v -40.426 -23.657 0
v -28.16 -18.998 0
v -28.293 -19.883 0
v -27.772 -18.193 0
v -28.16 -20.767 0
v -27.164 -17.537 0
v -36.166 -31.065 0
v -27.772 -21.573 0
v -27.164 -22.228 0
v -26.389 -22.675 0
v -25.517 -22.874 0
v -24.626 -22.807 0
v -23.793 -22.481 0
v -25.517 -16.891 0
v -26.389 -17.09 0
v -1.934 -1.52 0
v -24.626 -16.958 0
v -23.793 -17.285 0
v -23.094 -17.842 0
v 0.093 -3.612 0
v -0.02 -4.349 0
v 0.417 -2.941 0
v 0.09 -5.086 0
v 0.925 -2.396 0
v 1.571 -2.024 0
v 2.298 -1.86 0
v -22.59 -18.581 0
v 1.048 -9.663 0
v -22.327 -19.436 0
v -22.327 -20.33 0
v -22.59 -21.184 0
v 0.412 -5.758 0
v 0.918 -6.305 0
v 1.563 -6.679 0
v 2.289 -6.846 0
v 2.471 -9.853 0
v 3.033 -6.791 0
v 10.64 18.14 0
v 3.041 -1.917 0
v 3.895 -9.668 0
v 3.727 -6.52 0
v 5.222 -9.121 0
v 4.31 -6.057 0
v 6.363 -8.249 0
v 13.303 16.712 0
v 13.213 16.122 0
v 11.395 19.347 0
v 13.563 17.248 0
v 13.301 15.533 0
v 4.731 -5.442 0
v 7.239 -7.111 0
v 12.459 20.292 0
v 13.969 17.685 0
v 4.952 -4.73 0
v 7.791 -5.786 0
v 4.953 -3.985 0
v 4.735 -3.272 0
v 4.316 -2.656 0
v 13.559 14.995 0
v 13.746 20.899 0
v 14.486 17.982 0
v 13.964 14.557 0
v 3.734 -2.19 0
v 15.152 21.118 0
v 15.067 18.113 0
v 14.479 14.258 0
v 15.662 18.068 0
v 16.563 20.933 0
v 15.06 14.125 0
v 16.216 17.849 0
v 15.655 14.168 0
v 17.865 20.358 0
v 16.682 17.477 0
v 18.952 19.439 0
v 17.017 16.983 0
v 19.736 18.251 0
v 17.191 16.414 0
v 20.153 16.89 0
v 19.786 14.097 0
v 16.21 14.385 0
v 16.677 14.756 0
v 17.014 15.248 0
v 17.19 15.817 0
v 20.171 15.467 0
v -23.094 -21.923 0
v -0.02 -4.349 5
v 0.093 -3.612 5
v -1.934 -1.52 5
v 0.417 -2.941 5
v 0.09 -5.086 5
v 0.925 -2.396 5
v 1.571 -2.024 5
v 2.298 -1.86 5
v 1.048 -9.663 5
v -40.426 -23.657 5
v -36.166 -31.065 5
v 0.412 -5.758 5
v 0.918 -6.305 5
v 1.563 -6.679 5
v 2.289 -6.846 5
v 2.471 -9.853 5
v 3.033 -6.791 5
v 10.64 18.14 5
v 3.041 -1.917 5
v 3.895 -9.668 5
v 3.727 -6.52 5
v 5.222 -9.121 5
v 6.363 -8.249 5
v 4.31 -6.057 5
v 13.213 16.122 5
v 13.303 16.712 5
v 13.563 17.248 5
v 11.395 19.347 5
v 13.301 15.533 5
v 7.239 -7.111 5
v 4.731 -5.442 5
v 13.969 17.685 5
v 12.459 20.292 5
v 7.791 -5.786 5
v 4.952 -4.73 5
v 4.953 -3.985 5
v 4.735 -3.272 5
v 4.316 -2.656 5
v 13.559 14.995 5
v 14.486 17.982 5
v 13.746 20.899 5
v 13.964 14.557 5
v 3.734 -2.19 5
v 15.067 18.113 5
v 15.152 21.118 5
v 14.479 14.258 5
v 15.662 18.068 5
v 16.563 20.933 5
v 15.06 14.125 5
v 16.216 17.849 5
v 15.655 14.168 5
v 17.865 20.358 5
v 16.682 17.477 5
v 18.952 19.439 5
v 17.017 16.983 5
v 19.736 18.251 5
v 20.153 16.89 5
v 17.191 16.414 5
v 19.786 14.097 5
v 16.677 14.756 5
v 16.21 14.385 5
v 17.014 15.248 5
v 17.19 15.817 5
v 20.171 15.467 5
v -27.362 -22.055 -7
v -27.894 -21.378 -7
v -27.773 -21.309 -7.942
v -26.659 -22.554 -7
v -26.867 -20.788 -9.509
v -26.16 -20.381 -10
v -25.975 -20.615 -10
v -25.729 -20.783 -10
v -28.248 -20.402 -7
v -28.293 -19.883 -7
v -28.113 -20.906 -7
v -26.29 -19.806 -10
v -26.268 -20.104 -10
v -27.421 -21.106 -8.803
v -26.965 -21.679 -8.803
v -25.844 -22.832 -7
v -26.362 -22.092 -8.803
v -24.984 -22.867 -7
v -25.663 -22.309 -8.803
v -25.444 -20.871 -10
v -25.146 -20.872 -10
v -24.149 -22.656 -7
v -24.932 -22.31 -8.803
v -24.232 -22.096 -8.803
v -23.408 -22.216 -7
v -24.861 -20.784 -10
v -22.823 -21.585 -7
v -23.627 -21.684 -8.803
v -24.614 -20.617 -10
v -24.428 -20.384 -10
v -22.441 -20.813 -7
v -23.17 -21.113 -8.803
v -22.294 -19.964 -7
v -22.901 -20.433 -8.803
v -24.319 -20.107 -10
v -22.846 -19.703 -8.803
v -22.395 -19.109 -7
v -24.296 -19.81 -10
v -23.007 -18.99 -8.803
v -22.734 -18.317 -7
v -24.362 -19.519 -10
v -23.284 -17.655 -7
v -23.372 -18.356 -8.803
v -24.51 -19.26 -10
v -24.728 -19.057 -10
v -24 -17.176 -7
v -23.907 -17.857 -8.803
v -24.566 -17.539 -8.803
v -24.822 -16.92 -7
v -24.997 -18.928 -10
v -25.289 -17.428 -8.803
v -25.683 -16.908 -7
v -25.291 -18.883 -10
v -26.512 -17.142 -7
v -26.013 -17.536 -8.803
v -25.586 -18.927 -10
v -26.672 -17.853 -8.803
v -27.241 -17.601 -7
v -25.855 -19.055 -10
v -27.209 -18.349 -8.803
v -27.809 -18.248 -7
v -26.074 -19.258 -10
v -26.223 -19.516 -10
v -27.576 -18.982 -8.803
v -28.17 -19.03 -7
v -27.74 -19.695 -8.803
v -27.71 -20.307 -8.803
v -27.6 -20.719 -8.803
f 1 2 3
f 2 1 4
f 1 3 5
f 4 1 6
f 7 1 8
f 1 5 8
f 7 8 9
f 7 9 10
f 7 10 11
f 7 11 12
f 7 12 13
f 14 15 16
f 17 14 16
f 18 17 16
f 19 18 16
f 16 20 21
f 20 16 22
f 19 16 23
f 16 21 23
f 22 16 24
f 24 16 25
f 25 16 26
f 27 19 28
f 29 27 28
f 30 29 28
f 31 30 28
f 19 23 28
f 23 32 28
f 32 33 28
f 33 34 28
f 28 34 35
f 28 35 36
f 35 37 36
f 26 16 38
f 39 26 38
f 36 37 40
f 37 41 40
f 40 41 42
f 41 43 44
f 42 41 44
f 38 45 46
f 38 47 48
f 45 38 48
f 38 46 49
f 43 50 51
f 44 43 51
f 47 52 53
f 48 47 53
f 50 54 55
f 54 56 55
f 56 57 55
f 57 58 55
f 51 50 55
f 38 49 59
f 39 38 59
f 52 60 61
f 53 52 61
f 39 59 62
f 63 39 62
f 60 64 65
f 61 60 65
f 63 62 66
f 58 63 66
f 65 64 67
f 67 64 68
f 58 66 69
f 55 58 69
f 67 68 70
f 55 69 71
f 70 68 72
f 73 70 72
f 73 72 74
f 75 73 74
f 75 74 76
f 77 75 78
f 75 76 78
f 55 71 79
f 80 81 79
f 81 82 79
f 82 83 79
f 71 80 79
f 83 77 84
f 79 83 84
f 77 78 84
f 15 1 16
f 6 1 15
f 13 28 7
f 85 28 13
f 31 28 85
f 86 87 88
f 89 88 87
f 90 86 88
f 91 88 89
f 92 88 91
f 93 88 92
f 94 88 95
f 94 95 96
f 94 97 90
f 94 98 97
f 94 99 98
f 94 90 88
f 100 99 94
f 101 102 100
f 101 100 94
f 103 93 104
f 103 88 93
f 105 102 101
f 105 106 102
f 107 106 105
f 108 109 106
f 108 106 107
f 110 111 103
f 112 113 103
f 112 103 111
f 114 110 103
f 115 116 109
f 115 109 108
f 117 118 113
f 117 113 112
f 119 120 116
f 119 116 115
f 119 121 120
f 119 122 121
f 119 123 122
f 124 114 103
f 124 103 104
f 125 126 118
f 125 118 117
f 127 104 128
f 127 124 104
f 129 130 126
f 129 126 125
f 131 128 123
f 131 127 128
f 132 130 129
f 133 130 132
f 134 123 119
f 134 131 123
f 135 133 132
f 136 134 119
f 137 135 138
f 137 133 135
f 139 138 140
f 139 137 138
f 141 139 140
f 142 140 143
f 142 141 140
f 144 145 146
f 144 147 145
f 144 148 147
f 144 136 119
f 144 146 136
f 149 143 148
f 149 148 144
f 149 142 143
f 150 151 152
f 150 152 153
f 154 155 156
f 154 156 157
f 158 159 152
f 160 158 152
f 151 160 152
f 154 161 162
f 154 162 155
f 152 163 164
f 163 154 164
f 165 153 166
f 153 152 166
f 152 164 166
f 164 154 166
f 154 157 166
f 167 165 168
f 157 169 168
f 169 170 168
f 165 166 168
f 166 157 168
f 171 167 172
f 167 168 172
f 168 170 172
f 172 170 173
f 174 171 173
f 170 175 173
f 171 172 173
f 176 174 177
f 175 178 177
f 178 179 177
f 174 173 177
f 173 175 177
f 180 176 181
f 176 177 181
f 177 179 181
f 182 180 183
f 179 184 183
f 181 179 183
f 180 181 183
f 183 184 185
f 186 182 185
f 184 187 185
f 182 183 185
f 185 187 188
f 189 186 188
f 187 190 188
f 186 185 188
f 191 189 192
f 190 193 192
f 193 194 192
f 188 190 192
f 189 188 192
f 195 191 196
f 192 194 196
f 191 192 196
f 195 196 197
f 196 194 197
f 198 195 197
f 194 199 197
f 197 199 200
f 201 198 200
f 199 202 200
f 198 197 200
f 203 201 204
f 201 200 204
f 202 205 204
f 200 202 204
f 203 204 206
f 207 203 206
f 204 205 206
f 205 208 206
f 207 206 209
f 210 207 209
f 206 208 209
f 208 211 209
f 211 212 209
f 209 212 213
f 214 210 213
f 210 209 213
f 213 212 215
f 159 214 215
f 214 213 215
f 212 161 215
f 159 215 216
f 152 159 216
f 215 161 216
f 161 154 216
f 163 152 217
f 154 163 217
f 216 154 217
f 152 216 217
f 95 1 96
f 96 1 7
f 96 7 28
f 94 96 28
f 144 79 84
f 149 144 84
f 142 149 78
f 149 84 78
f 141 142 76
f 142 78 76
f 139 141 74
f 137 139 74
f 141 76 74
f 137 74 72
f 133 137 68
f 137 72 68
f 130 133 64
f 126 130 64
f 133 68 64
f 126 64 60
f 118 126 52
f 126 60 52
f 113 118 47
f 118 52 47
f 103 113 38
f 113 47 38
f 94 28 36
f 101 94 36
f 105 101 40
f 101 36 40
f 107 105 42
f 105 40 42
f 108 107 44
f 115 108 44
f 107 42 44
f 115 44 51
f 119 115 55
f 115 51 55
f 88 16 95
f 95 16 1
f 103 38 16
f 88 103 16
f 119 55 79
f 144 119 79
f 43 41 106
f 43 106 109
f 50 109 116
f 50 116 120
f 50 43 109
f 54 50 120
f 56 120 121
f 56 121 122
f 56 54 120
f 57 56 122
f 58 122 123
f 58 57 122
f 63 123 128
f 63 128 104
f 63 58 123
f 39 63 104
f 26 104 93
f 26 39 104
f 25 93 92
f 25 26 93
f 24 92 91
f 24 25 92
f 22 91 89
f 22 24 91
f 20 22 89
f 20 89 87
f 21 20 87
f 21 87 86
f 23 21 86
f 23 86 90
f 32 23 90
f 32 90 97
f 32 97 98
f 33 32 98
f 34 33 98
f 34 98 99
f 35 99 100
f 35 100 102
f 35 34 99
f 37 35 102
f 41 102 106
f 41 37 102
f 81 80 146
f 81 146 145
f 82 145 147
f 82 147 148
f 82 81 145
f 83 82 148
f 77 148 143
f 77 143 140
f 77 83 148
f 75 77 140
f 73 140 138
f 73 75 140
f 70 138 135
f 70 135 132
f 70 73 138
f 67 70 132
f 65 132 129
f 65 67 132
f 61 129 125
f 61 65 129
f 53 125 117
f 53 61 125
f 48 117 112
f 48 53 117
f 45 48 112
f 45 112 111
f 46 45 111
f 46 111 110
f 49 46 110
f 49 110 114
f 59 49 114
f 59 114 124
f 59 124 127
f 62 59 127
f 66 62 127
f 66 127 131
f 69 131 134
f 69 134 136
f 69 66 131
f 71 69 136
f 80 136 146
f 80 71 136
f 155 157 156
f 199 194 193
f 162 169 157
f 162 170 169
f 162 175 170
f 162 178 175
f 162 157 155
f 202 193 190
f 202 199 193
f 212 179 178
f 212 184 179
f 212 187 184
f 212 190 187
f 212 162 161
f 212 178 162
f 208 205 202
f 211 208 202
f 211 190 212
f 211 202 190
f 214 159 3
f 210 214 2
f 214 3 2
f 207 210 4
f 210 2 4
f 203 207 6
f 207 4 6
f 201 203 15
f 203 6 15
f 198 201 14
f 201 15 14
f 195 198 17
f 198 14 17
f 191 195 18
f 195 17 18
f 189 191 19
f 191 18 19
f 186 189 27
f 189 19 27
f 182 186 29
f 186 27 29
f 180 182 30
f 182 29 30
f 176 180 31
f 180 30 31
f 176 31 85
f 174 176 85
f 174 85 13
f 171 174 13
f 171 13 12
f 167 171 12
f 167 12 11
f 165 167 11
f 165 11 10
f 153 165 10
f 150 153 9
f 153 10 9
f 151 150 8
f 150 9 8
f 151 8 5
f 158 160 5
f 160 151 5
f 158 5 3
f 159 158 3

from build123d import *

# Parameters (mm, degrees)
SKETCH1_R           = 2
SKETCH1_R_2         = 2.5
BOSS_EXTRUDE1_DEPTH = 5
SKETCH8_R           = 3
BOSS_EXTRUDE3_DEPTH = 10


with BuildPart() as part:
    # Sketch1 → Boss-Extrude1 (new body)
    with BuildSketch(Plane(origin=(0, 0, 0), x_dir=(0.498528904, -0.866873077, 0), z_dir=(0, 0, 1))):
        with BuildLine():
            Line((8.899126574, 3.869128256), (-2.35642803, 24.179978159))
            ThreePointArc((-2.35642803, 24.179978159), (-9.345167797, 25.255857552), (-10.421047189, 18.267117784))
            Line((-10.421047189, 18.267117784), (1.120951981, -3.909046337))
            ThreePointArc((1.120951981, -3.909046337), (8.899126574, -3.909046337), (8.899126574, 3.869128256))
        make_face()
        with Locations((-6.38873761, 21.223547972)):
            Circle(SKETCH1_R, mode=Mode.SUBTRACT)
        with Locations((5.010039278, -0.019959041)):
            Circle(SKETCH1_R_2, mode=Mode.SUBTRACT)
        with BuildLine():
            Line((8.899126574, -46.838046337), (8.899126574, -3.909046337))
            ThreePointArc((8.899126574, -3.909046337), (5.010039278, -5.519959041), (1.120951981, -3.909046337))
            Line((1.120951981, -3.909046337), (0.353553391, -2.434608777))
            Line((0.353553391, -2.434608777), (0.353553391, -46.838046337))
            Line((0.353553391, -46.838046337), (8.899126574, -46.838046337))
        make_face()
    extrude(amount=BOSS_EXTRUDE1_DEPTH)

    # Sketch8 → Boss-Extrude3 (add)
    with BuildSketch(Plane(origin=(0, 0, 0), x_dir=(-1, 0, 0), z_dir=(0, 0, -1))):
        with Locations((25.293181008, -19.882635909)):
            Circle(SKETCH8_R)
    extrude(amount=BOSS_EXTRUDE3_DEPTH)

    # Sketch9 → Cut-Revolve1 (revolve, cut)
    with BuildSketch(Plane(origin=(2.306364199, -4.010449578, 0), x_dir=(-0.866873077, -0.498528904, 0), z_dir=(0.498528904, -0.866873077, 0))):
        with BuildLine():
            Line((32.838046337, 10), (34.838046337, 10))
            Line((34.838046337, 10), (34.838046337, 7))
            ThreePointArc((34.838046337, 7), (34.292209794, 8.802775638), (32.838046337, 10))
        make_face()
    revolve(axis=Axis((-25.293181008, -19.882635909, -10), (0, 0, 1)), mode=Mode.SUBTRACT)


solid = part.part
